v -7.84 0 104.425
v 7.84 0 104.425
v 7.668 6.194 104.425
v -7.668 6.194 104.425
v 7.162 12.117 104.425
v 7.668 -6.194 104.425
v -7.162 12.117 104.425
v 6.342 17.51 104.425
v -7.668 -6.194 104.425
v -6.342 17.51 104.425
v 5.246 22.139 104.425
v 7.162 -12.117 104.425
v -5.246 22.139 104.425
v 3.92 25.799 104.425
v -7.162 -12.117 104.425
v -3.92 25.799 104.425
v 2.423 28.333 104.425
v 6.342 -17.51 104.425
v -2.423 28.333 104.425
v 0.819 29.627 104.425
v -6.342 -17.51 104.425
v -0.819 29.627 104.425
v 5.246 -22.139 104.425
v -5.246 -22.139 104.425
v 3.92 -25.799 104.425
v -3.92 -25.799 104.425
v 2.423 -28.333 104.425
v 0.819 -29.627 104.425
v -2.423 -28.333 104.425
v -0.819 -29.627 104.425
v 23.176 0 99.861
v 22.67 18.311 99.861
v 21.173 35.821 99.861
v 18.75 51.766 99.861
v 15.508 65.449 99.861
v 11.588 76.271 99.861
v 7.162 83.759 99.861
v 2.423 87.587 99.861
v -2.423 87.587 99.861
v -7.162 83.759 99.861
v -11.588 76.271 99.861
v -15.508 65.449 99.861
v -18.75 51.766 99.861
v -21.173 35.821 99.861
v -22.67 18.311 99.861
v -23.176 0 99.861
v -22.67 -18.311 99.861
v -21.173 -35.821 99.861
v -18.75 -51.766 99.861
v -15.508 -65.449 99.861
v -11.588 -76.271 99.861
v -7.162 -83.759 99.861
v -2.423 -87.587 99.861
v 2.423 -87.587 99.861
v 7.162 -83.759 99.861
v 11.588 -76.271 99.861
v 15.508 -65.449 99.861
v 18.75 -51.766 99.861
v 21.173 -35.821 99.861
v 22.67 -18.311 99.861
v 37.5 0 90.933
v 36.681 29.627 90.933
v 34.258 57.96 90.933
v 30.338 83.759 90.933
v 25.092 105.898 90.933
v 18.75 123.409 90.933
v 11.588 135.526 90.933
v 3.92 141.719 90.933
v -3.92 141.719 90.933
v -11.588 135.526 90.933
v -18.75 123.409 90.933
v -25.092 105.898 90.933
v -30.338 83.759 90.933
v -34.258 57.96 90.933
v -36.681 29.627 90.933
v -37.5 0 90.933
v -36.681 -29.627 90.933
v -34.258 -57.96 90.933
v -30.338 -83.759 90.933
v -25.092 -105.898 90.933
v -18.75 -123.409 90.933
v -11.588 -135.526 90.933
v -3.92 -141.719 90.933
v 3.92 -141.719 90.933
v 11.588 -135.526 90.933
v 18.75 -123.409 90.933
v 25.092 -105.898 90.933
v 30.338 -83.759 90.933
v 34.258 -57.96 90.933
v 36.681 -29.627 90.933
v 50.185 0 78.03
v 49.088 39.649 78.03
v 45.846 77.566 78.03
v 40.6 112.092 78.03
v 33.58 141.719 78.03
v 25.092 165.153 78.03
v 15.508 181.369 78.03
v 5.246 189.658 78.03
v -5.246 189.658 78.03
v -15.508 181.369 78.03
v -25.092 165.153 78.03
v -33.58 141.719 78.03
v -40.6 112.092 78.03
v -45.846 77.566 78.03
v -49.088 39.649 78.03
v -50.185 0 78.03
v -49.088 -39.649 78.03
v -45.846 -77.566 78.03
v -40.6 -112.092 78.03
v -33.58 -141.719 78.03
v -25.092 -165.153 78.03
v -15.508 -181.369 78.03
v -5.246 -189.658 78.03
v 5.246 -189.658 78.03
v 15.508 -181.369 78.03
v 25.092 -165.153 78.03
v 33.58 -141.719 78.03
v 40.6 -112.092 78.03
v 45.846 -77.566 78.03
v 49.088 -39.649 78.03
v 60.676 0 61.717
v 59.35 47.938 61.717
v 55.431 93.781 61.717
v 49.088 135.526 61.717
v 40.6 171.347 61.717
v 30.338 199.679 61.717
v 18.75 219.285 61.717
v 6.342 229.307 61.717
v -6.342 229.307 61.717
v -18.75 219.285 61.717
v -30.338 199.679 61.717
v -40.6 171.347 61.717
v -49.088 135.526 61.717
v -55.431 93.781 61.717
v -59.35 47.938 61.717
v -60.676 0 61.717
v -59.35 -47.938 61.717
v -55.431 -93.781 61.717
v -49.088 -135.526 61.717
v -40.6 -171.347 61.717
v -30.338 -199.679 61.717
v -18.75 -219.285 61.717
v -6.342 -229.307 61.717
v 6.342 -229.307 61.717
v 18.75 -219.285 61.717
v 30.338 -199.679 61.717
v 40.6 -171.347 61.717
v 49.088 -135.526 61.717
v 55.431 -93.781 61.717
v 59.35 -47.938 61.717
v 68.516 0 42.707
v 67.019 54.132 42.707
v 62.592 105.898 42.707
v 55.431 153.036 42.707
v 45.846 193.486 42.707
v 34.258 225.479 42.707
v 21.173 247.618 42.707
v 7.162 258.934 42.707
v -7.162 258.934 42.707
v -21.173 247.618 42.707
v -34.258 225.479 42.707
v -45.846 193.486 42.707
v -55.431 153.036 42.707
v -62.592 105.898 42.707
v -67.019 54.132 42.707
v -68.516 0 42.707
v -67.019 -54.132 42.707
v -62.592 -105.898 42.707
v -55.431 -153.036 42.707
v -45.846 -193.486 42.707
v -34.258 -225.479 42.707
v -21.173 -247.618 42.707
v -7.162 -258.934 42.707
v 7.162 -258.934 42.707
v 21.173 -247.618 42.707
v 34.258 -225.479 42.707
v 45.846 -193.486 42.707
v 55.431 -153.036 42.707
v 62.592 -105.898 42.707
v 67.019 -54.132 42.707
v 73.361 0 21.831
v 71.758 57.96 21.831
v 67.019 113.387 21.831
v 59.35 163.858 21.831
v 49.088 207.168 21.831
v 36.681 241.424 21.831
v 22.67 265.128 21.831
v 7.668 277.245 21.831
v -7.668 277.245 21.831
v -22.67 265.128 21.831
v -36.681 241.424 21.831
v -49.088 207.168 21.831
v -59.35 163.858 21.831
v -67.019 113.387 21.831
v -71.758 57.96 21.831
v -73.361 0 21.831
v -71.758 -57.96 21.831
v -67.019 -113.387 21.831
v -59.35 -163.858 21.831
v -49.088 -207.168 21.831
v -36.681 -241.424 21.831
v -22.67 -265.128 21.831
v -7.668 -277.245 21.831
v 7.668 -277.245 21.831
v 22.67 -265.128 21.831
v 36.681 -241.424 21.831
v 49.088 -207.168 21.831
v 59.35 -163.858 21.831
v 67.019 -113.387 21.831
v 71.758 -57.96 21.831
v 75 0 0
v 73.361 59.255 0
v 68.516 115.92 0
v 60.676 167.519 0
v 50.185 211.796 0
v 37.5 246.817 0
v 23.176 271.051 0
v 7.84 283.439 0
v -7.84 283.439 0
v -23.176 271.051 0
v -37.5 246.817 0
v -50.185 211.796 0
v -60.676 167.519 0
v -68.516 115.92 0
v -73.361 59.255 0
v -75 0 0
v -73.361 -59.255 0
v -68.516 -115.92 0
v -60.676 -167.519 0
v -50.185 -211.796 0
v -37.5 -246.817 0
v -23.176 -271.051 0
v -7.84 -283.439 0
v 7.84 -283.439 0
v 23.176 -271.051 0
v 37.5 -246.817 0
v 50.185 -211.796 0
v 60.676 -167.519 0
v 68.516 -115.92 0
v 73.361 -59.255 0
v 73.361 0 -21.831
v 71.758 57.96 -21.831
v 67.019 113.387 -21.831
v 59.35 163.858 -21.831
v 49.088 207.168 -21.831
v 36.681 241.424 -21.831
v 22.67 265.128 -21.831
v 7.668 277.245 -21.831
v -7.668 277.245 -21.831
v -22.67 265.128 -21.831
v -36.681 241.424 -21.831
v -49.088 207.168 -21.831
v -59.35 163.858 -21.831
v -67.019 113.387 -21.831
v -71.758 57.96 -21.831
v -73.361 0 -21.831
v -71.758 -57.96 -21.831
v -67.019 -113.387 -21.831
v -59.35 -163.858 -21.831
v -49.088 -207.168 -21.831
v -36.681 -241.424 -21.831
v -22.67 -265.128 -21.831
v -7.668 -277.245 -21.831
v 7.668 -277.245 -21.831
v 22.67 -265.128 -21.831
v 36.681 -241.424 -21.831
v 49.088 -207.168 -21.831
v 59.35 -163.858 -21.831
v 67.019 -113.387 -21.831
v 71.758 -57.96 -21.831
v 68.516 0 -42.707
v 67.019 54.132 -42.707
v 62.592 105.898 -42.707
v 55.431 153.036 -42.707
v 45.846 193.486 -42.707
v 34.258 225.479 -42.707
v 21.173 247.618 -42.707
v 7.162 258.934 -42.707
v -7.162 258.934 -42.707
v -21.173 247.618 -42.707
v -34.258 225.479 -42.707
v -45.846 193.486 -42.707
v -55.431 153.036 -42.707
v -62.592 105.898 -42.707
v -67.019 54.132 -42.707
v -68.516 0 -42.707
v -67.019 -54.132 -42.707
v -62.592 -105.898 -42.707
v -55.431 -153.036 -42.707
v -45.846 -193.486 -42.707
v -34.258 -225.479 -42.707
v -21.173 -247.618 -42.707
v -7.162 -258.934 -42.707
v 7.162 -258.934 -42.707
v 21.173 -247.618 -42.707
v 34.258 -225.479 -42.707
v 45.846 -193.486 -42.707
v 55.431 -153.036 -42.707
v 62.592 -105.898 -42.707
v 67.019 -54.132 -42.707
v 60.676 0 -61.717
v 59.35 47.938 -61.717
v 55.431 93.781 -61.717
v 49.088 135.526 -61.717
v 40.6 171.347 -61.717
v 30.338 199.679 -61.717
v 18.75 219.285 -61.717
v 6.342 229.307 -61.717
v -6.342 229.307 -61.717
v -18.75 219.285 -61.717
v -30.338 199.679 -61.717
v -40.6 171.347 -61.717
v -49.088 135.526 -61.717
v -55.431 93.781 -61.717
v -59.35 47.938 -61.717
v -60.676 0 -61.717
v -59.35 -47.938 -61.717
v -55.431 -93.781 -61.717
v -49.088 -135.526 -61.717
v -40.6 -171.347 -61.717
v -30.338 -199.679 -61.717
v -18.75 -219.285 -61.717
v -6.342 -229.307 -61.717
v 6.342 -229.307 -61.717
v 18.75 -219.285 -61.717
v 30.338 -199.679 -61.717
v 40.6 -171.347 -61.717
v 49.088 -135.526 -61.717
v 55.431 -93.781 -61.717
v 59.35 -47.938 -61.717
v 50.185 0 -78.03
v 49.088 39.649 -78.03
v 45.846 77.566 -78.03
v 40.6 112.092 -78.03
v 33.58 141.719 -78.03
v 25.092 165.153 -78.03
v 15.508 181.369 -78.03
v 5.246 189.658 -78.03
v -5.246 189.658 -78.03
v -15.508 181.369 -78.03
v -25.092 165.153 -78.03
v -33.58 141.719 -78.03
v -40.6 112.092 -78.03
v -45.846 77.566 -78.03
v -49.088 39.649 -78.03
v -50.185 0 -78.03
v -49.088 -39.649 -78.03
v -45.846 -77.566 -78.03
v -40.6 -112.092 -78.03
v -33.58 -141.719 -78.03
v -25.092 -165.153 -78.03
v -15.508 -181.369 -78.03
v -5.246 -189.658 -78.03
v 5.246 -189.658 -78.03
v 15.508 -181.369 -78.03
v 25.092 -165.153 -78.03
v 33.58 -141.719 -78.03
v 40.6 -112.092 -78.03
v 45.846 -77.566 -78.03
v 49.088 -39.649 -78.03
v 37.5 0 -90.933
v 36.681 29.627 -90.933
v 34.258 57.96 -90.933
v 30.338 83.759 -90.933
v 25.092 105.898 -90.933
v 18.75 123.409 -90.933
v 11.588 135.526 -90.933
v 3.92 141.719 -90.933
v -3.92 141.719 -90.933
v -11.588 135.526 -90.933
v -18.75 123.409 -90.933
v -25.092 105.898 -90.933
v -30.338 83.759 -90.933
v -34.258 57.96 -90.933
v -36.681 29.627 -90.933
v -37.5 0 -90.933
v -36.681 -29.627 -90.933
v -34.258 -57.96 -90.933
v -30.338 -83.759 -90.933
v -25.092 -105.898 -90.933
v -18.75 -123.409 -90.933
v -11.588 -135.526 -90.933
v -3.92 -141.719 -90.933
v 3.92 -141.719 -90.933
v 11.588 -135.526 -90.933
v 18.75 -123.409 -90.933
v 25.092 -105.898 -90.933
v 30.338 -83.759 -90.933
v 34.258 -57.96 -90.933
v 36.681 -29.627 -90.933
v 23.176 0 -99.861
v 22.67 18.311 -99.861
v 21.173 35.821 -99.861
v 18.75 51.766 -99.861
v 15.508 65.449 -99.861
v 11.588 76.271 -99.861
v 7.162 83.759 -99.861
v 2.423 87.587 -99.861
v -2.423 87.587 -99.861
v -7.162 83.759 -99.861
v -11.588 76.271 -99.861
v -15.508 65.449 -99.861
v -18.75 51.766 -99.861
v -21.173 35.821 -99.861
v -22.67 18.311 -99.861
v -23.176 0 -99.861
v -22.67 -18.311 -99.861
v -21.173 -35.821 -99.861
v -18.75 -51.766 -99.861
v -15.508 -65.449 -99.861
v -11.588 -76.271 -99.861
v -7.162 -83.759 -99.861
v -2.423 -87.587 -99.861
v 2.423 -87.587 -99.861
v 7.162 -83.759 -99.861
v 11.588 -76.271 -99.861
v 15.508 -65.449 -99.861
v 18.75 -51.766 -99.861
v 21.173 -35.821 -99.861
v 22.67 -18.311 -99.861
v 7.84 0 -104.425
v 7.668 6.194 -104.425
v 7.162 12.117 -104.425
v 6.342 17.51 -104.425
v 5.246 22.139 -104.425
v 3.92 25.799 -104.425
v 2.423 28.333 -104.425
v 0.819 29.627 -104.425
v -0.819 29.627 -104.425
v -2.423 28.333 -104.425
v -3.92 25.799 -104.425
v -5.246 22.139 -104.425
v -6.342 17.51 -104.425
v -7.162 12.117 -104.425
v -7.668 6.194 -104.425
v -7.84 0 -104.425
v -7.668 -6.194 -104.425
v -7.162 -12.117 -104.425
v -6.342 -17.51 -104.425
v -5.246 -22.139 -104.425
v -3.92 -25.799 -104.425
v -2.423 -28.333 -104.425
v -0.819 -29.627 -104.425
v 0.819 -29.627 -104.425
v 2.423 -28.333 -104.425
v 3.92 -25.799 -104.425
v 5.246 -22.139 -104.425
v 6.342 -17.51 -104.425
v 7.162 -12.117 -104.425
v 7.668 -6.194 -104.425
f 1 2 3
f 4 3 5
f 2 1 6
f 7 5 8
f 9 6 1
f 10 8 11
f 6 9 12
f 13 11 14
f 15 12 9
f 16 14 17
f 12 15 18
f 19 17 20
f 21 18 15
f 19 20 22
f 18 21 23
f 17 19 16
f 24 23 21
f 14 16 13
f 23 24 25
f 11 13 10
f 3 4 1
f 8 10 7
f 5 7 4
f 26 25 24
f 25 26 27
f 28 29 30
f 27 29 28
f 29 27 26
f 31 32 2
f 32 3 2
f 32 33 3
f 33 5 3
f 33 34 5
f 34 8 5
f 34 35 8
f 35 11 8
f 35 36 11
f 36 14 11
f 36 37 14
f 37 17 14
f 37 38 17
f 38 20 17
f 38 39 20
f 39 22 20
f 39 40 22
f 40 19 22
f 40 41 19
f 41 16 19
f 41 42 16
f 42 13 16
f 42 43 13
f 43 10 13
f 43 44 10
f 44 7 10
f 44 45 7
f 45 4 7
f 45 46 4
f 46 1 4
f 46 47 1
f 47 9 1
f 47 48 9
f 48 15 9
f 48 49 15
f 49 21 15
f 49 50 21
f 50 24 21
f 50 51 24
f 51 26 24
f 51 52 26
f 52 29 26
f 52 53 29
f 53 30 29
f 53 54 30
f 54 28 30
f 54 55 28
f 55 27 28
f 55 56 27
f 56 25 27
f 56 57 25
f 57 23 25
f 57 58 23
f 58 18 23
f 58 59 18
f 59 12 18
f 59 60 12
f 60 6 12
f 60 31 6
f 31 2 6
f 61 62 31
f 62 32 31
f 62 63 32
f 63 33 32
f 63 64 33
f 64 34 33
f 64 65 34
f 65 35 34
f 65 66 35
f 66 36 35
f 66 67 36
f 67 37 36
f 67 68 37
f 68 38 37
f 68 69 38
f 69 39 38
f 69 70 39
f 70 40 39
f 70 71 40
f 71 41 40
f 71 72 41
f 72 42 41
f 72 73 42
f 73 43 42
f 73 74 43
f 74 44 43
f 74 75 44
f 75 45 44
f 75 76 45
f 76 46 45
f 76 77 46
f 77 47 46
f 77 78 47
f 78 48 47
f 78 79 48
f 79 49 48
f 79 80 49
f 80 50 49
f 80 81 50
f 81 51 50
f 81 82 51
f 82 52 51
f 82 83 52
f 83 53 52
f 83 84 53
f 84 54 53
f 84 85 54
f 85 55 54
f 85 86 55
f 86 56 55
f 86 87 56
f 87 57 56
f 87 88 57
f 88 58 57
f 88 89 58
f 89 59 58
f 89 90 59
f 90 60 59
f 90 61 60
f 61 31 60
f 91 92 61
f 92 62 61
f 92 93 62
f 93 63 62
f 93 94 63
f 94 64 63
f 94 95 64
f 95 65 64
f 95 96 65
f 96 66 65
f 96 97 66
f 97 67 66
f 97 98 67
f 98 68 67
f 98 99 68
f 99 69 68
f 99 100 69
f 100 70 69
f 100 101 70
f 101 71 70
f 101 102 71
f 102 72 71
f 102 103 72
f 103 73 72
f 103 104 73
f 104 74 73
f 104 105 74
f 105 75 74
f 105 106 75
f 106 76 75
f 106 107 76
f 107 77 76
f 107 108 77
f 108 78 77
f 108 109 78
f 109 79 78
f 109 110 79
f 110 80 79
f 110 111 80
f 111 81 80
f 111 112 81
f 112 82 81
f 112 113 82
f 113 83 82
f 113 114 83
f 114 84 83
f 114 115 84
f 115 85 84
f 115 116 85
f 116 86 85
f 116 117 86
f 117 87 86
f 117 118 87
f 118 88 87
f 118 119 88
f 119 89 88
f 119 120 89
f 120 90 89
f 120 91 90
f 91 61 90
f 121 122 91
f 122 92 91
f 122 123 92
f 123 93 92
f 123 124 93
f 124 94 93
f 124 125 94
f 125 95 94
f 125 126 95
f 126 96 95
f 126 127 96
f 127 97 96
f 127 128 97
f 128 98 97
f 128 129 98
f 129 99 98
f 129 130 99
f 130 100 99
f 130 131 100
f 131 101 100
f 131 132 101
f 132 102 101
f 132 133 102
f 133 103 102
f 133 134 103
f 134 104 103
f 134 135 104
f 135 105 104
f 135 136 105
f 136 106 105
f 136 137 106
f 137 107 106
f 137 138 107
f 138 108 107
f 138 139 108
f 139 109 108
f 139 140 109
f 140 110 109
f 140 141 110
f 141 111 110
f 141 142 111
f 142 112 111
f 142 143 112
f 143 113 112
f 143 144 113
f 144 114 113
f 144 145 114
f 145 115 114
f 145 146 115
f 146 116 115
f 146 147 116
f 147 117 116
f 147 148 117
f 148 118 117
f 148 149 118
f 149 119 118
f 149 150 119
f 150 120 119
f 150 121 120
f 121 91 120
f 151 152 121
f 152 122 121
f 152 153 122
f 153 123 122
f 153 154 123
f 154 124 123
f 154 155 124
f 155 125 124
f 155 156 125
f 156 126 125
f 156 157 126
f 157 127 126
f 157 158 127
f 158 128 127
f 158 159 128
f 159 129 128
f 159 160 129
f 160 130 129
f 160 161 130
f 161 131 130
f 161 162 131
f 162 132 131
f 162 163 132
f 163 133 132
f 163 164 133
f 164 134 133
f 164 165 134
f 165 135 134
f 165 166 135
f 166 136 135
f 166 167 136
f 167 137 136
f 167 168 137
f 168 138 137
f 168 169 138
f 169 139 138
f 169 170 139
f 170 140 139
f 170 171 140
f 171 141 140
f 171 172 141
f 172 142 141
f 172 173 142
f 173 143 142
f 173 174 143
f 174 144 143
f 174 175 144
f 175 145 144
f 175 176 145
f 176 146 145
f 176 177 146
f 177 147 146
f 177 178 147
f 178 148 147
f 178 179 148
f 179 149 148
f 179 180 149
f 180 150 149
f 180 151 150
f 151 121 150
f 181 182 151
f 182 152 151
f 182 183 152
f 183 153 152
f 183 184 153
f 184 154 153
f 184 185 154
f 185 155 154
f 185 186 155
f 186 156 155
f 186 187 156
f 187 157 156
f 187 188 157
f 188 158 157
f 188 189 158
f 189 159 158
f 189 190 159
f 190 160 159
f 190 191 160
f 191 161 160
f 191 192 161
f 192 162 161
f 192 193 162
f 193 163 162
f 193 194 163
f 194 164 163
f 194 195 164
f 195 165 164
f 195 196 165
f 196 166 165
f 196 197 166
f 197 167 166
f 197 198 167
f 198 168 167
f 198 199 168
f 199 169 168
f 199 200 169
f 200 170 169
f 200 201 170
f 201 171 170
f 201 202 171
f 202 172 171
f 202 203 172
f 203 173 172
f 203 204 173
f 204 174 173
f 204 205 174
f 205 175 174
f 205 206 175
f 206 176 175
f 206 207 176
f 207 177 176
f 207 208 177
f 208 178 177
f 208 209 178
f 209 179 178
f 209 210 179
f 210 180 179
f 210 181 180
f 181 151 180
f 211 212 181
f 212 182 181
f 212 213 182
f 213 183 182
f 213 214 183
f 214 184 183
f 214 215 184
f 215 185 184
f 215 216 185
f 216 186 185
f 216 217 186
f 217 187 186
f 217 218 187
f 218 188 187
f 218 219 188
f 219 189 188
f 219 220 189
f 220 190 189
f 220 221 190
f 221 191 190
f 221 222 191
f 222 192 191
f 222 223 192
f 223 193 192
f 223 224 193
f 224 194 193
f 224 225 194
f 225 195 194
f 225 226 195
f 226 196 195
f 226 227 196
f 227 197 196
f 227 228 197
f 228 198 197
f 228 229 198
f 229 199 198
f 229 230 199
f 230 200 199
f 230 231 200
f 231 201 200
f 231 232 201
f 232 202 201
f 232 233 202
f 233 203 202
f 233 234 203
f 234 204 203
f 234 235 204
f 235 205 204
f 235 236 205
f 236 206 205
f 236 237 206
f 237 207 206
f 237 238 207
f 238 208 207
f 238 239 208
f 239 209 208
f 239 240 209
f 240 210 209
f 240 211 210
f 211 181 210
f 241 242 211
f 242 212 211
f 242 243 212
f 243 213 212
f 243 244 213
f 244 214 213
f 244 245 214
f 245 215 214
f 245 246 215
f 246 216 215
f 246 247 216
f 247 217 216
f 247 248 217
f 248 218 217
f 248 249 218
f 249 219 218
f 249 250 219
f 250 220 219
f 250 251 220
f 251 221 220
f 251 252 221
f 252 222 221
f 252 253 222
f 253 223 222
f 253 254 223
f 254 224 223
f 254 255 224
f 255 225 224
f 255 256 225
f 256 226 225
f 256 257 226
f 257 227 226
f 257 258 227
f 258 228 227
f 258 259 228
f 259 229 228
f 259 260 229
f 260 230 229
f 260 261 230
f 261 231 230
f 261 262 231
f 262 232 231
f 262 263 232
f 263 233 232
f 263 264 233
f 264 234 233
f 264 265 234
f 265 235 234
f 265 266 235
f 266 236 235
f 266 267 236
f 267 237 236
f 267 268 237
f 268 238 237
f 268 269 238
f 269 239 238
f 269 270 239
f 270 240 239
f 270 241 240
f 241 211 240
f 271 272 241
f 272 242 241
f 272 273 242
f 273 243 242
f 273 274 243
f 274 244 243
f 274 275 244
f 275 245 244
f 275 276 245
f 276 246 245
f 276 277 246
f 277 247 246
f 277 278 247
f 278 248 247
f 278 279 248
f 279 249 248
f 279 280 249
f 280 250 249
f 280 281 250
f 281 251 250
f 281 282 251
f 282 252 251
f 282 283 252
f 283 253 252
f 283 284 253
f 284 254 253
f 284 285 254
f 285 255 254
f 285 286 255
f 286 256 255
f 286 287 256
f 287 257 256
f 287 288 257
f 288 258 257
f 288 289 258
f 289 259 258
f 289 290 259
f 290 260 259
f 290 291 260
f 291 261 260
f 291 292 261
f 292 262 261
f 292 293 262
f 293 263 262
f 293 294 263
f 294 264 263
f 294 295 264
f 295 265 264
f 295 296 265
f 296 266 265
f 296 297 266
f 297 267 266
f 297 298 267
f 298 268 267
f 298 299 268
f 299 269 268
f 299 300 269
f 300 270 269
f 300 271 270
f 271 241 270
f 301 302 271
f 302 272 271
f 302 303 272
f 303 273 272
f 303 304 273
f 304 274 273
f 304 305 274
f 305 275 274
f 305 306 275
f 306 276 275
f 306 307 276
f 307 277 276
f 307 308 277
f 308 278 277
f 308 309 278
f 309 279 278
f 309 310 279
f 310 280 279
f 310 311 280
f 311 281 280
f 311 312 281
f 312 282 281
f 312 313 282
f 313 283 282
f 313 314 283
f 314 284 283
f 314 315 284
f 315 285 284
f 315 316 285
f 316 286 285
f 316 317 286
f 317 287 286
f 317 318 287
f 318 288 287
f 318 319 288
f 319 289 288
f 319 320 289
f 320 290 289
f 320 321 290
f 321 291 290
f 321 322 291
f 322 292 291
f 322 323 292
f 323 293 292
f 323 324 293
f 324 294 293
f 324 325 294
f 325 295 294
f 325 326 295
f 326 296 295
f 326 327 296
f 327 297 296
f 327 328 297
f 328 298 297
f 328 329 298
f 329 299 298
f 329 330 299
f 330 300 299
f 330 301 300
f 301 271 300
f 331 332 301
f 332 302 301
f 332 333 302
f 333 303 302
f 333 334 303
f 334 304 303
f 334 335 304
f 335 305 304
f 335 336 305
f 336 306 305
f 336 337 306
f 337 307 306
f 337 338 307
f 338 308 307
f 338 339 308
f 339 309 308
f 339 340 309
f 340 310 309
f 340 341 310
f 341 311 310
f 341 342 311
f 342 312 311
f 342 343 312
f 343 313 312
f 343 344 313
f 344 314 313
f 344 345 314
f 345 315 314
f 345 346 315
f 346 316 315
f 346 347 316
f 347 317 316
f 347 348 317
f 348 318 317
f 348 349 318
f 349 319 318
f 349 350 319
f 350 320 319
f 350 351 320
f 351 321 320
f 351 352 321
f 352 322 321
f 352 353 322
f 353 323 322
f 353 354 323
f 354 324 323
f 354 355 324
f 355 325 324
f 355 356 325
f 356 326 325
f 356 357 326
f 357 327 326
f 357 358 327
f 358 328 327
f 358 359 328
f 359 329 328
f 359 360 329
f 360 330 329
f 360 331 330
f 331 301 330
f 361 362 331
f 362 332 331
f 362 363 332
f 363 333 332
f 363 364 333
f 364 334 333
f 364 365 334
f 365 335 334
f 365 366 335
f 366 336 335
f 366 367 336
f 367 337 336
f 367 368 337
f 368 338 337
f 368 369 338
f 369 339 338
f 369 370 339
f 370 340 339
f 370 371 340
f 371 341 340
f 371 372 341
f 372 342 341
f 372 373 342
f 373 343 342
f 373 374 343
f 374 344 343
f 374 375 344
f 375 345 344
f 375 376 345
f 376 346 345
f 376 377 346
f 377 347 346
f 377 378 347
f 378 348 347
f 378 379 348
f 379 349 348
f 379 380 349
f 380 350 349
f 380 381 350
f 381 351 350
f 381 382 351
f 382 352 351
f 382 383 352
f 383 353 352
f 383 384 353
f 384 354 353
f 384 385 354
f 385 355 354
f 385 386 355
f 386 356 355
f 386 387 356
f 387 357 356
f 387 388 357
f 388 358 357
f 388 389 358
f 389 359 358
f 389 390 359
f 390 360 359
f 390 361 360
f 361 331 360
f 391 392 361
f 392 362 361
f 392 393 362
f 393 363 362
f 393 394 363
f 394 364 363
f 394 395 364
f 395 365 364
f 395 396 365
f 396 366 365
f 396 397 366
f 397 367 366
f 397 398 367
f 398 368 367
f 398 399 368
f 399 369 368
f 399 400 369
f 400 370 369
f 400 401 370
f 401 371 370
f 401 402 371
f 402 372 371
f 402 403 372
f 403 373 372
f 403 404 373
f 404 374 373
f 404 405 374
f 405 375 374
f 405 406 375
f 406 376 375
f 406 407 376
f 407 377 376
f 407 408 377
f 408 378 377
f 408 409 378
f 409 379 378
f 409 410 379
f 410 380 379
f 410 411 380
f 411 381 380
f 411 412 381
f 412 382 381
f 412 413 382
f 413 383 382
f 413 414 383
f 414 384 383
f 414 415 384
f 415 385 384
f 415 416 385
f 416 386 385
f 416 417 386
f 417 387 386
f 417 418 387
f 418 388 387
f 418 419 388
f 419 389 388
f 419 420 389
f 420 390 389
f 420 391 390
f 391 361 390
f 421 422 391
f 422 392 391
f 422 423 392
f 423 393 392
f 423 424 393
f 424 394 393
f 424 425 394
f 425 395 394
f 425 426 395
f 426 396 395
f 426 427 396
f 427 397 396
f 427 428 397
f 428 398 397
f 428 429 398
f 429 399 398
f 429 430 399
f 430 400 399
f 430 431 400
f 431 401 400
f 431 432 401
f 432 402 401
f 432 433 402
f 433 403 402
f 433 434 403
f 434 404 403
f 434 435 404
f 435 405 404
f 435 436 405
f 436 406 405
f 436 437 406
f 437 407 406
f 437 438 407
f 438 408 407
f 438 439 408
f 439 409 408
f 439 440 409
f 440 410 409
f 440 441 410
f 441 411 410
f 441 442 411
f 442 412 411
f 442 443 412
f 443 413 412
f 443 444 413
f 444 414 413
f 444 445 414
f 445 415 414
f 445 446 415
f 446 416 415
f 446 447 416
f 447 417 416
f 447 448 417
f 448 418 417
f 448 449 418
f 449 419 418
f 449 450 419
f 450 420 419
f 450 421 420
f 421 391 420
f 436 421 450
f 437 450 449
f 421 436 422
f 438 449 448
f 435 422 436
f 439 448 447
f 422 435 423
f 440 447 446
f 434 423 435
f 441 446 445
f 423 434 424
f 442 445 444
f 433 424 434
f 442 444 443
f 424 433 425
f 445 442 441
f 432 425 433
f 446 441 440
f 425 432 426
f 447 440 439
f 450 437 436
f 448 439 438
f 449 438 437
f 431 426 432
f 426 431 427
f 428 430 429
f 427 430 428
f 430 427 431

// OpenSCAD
// Generated by SolidPython 1.0.1 on 2020-07-29 00:46:47


scale(v = [5, 19, 7]) {
	sphere(r = 15);
}
/***********************************************
*********      SolidPython code:      **********
************************************************
 
# import packages: SolidPython
from solid import *
from solid.utils import *
from itertools import chain, combinations, permutations


class Resize:

    def __init__(self, scad_file):
        self.scad_file = scad_file
        #self.scad_file = import_scad(scad_file)
        # cone/cylinder param:
        self.r1 = 0
        self.r2 = 0
        self.h = 0
        # rectangular prism param:
        self.w = 0
        self.l = 0
        # ellipse param:
        self.r = 0

    # import OpenScad code (file name corresponds to shape)


    # classify shape + parameters
    def assign(self, param1, param2, param3):
        if self.scad_file == 'cone.scad':
            self.r1 = param1
            self.r2 = param2
            self.h = param3
        elif self.scad_file == 'cylinder.scad':
            self.r1 = param1
            self.r2 = param2
            self.h = param3
        elif self.scad_file == 'rectangularPrism.scad':
            self.h = param1
            self.l = param2
            self.w = param3
        else:
            self.r = param1
            self.h = param2

    # resize parameters
    def iterate(self):
        x = range(3, 20, 2)
        i = 1
        if self.scad_file == 'cone.scad':
            tempList = list(permutations(x, 2))
            for temp in tempList:
                param1 = temp[0]
                param2 = temp[1]
                filepath = 'produced_scad_files/' + 'cone' + str(param1) + '_' + str(param2) + '_' + '.scad'
                scad_render_to_file(cylinder(h=param1, r1=param2, r2=0), filepath)

        elif self.scad_file == 'cylinder.scad':
            tempList = list(permutations(x, 3))
            for temp in tempList:
                param1 = temp[0]
                param2 = temp[1]
                filepath = 'produced_scad_files/' + 'cylinder' + str(param1) + '_' + str(param2) + '_' + '.scad'
                scad_render_to_file(cylinder(h=param1, r1=param2, r2=param2), filepath)

        elif self.scad_file == 'rectangularPrism.scad':
            tempList = list(permutations(x, 3))
            for temp in tempList:
                param1 = temp[0]
                param2 = temp[1]
                param3 = temp[2]
                filepath = 'produced_scad_files/' + 'rectangularPrism' + str(param1) + '_' + str(param2) + '_' + str(
                    param3) + '.scad'
                scad_render_to_file(cube(size=(param1, param2, param3)), filepath)

        elif self.scad_file == 'ellipse.scad':
            tempList = list(permutations(x, 4))
            for temp in tempList:
                param1 = temp[0]
                param2 = temp[1]
                param3 = temp[2]
                param4 = temp[3]
                filepath = 'produced_scad_files/' + 'ellipse' + str(param1) + '_' + str(param2) + '_' + str(param3) + '_' + str(param4) + '.scad'
                scad_render_to_file(scale([param1, param2, param3])(sphere(r=param4)), filepath)

    def render_to_scadfile(self):
        scad_render_to_file(scad, 'example.scad') 
 
************************************************/
